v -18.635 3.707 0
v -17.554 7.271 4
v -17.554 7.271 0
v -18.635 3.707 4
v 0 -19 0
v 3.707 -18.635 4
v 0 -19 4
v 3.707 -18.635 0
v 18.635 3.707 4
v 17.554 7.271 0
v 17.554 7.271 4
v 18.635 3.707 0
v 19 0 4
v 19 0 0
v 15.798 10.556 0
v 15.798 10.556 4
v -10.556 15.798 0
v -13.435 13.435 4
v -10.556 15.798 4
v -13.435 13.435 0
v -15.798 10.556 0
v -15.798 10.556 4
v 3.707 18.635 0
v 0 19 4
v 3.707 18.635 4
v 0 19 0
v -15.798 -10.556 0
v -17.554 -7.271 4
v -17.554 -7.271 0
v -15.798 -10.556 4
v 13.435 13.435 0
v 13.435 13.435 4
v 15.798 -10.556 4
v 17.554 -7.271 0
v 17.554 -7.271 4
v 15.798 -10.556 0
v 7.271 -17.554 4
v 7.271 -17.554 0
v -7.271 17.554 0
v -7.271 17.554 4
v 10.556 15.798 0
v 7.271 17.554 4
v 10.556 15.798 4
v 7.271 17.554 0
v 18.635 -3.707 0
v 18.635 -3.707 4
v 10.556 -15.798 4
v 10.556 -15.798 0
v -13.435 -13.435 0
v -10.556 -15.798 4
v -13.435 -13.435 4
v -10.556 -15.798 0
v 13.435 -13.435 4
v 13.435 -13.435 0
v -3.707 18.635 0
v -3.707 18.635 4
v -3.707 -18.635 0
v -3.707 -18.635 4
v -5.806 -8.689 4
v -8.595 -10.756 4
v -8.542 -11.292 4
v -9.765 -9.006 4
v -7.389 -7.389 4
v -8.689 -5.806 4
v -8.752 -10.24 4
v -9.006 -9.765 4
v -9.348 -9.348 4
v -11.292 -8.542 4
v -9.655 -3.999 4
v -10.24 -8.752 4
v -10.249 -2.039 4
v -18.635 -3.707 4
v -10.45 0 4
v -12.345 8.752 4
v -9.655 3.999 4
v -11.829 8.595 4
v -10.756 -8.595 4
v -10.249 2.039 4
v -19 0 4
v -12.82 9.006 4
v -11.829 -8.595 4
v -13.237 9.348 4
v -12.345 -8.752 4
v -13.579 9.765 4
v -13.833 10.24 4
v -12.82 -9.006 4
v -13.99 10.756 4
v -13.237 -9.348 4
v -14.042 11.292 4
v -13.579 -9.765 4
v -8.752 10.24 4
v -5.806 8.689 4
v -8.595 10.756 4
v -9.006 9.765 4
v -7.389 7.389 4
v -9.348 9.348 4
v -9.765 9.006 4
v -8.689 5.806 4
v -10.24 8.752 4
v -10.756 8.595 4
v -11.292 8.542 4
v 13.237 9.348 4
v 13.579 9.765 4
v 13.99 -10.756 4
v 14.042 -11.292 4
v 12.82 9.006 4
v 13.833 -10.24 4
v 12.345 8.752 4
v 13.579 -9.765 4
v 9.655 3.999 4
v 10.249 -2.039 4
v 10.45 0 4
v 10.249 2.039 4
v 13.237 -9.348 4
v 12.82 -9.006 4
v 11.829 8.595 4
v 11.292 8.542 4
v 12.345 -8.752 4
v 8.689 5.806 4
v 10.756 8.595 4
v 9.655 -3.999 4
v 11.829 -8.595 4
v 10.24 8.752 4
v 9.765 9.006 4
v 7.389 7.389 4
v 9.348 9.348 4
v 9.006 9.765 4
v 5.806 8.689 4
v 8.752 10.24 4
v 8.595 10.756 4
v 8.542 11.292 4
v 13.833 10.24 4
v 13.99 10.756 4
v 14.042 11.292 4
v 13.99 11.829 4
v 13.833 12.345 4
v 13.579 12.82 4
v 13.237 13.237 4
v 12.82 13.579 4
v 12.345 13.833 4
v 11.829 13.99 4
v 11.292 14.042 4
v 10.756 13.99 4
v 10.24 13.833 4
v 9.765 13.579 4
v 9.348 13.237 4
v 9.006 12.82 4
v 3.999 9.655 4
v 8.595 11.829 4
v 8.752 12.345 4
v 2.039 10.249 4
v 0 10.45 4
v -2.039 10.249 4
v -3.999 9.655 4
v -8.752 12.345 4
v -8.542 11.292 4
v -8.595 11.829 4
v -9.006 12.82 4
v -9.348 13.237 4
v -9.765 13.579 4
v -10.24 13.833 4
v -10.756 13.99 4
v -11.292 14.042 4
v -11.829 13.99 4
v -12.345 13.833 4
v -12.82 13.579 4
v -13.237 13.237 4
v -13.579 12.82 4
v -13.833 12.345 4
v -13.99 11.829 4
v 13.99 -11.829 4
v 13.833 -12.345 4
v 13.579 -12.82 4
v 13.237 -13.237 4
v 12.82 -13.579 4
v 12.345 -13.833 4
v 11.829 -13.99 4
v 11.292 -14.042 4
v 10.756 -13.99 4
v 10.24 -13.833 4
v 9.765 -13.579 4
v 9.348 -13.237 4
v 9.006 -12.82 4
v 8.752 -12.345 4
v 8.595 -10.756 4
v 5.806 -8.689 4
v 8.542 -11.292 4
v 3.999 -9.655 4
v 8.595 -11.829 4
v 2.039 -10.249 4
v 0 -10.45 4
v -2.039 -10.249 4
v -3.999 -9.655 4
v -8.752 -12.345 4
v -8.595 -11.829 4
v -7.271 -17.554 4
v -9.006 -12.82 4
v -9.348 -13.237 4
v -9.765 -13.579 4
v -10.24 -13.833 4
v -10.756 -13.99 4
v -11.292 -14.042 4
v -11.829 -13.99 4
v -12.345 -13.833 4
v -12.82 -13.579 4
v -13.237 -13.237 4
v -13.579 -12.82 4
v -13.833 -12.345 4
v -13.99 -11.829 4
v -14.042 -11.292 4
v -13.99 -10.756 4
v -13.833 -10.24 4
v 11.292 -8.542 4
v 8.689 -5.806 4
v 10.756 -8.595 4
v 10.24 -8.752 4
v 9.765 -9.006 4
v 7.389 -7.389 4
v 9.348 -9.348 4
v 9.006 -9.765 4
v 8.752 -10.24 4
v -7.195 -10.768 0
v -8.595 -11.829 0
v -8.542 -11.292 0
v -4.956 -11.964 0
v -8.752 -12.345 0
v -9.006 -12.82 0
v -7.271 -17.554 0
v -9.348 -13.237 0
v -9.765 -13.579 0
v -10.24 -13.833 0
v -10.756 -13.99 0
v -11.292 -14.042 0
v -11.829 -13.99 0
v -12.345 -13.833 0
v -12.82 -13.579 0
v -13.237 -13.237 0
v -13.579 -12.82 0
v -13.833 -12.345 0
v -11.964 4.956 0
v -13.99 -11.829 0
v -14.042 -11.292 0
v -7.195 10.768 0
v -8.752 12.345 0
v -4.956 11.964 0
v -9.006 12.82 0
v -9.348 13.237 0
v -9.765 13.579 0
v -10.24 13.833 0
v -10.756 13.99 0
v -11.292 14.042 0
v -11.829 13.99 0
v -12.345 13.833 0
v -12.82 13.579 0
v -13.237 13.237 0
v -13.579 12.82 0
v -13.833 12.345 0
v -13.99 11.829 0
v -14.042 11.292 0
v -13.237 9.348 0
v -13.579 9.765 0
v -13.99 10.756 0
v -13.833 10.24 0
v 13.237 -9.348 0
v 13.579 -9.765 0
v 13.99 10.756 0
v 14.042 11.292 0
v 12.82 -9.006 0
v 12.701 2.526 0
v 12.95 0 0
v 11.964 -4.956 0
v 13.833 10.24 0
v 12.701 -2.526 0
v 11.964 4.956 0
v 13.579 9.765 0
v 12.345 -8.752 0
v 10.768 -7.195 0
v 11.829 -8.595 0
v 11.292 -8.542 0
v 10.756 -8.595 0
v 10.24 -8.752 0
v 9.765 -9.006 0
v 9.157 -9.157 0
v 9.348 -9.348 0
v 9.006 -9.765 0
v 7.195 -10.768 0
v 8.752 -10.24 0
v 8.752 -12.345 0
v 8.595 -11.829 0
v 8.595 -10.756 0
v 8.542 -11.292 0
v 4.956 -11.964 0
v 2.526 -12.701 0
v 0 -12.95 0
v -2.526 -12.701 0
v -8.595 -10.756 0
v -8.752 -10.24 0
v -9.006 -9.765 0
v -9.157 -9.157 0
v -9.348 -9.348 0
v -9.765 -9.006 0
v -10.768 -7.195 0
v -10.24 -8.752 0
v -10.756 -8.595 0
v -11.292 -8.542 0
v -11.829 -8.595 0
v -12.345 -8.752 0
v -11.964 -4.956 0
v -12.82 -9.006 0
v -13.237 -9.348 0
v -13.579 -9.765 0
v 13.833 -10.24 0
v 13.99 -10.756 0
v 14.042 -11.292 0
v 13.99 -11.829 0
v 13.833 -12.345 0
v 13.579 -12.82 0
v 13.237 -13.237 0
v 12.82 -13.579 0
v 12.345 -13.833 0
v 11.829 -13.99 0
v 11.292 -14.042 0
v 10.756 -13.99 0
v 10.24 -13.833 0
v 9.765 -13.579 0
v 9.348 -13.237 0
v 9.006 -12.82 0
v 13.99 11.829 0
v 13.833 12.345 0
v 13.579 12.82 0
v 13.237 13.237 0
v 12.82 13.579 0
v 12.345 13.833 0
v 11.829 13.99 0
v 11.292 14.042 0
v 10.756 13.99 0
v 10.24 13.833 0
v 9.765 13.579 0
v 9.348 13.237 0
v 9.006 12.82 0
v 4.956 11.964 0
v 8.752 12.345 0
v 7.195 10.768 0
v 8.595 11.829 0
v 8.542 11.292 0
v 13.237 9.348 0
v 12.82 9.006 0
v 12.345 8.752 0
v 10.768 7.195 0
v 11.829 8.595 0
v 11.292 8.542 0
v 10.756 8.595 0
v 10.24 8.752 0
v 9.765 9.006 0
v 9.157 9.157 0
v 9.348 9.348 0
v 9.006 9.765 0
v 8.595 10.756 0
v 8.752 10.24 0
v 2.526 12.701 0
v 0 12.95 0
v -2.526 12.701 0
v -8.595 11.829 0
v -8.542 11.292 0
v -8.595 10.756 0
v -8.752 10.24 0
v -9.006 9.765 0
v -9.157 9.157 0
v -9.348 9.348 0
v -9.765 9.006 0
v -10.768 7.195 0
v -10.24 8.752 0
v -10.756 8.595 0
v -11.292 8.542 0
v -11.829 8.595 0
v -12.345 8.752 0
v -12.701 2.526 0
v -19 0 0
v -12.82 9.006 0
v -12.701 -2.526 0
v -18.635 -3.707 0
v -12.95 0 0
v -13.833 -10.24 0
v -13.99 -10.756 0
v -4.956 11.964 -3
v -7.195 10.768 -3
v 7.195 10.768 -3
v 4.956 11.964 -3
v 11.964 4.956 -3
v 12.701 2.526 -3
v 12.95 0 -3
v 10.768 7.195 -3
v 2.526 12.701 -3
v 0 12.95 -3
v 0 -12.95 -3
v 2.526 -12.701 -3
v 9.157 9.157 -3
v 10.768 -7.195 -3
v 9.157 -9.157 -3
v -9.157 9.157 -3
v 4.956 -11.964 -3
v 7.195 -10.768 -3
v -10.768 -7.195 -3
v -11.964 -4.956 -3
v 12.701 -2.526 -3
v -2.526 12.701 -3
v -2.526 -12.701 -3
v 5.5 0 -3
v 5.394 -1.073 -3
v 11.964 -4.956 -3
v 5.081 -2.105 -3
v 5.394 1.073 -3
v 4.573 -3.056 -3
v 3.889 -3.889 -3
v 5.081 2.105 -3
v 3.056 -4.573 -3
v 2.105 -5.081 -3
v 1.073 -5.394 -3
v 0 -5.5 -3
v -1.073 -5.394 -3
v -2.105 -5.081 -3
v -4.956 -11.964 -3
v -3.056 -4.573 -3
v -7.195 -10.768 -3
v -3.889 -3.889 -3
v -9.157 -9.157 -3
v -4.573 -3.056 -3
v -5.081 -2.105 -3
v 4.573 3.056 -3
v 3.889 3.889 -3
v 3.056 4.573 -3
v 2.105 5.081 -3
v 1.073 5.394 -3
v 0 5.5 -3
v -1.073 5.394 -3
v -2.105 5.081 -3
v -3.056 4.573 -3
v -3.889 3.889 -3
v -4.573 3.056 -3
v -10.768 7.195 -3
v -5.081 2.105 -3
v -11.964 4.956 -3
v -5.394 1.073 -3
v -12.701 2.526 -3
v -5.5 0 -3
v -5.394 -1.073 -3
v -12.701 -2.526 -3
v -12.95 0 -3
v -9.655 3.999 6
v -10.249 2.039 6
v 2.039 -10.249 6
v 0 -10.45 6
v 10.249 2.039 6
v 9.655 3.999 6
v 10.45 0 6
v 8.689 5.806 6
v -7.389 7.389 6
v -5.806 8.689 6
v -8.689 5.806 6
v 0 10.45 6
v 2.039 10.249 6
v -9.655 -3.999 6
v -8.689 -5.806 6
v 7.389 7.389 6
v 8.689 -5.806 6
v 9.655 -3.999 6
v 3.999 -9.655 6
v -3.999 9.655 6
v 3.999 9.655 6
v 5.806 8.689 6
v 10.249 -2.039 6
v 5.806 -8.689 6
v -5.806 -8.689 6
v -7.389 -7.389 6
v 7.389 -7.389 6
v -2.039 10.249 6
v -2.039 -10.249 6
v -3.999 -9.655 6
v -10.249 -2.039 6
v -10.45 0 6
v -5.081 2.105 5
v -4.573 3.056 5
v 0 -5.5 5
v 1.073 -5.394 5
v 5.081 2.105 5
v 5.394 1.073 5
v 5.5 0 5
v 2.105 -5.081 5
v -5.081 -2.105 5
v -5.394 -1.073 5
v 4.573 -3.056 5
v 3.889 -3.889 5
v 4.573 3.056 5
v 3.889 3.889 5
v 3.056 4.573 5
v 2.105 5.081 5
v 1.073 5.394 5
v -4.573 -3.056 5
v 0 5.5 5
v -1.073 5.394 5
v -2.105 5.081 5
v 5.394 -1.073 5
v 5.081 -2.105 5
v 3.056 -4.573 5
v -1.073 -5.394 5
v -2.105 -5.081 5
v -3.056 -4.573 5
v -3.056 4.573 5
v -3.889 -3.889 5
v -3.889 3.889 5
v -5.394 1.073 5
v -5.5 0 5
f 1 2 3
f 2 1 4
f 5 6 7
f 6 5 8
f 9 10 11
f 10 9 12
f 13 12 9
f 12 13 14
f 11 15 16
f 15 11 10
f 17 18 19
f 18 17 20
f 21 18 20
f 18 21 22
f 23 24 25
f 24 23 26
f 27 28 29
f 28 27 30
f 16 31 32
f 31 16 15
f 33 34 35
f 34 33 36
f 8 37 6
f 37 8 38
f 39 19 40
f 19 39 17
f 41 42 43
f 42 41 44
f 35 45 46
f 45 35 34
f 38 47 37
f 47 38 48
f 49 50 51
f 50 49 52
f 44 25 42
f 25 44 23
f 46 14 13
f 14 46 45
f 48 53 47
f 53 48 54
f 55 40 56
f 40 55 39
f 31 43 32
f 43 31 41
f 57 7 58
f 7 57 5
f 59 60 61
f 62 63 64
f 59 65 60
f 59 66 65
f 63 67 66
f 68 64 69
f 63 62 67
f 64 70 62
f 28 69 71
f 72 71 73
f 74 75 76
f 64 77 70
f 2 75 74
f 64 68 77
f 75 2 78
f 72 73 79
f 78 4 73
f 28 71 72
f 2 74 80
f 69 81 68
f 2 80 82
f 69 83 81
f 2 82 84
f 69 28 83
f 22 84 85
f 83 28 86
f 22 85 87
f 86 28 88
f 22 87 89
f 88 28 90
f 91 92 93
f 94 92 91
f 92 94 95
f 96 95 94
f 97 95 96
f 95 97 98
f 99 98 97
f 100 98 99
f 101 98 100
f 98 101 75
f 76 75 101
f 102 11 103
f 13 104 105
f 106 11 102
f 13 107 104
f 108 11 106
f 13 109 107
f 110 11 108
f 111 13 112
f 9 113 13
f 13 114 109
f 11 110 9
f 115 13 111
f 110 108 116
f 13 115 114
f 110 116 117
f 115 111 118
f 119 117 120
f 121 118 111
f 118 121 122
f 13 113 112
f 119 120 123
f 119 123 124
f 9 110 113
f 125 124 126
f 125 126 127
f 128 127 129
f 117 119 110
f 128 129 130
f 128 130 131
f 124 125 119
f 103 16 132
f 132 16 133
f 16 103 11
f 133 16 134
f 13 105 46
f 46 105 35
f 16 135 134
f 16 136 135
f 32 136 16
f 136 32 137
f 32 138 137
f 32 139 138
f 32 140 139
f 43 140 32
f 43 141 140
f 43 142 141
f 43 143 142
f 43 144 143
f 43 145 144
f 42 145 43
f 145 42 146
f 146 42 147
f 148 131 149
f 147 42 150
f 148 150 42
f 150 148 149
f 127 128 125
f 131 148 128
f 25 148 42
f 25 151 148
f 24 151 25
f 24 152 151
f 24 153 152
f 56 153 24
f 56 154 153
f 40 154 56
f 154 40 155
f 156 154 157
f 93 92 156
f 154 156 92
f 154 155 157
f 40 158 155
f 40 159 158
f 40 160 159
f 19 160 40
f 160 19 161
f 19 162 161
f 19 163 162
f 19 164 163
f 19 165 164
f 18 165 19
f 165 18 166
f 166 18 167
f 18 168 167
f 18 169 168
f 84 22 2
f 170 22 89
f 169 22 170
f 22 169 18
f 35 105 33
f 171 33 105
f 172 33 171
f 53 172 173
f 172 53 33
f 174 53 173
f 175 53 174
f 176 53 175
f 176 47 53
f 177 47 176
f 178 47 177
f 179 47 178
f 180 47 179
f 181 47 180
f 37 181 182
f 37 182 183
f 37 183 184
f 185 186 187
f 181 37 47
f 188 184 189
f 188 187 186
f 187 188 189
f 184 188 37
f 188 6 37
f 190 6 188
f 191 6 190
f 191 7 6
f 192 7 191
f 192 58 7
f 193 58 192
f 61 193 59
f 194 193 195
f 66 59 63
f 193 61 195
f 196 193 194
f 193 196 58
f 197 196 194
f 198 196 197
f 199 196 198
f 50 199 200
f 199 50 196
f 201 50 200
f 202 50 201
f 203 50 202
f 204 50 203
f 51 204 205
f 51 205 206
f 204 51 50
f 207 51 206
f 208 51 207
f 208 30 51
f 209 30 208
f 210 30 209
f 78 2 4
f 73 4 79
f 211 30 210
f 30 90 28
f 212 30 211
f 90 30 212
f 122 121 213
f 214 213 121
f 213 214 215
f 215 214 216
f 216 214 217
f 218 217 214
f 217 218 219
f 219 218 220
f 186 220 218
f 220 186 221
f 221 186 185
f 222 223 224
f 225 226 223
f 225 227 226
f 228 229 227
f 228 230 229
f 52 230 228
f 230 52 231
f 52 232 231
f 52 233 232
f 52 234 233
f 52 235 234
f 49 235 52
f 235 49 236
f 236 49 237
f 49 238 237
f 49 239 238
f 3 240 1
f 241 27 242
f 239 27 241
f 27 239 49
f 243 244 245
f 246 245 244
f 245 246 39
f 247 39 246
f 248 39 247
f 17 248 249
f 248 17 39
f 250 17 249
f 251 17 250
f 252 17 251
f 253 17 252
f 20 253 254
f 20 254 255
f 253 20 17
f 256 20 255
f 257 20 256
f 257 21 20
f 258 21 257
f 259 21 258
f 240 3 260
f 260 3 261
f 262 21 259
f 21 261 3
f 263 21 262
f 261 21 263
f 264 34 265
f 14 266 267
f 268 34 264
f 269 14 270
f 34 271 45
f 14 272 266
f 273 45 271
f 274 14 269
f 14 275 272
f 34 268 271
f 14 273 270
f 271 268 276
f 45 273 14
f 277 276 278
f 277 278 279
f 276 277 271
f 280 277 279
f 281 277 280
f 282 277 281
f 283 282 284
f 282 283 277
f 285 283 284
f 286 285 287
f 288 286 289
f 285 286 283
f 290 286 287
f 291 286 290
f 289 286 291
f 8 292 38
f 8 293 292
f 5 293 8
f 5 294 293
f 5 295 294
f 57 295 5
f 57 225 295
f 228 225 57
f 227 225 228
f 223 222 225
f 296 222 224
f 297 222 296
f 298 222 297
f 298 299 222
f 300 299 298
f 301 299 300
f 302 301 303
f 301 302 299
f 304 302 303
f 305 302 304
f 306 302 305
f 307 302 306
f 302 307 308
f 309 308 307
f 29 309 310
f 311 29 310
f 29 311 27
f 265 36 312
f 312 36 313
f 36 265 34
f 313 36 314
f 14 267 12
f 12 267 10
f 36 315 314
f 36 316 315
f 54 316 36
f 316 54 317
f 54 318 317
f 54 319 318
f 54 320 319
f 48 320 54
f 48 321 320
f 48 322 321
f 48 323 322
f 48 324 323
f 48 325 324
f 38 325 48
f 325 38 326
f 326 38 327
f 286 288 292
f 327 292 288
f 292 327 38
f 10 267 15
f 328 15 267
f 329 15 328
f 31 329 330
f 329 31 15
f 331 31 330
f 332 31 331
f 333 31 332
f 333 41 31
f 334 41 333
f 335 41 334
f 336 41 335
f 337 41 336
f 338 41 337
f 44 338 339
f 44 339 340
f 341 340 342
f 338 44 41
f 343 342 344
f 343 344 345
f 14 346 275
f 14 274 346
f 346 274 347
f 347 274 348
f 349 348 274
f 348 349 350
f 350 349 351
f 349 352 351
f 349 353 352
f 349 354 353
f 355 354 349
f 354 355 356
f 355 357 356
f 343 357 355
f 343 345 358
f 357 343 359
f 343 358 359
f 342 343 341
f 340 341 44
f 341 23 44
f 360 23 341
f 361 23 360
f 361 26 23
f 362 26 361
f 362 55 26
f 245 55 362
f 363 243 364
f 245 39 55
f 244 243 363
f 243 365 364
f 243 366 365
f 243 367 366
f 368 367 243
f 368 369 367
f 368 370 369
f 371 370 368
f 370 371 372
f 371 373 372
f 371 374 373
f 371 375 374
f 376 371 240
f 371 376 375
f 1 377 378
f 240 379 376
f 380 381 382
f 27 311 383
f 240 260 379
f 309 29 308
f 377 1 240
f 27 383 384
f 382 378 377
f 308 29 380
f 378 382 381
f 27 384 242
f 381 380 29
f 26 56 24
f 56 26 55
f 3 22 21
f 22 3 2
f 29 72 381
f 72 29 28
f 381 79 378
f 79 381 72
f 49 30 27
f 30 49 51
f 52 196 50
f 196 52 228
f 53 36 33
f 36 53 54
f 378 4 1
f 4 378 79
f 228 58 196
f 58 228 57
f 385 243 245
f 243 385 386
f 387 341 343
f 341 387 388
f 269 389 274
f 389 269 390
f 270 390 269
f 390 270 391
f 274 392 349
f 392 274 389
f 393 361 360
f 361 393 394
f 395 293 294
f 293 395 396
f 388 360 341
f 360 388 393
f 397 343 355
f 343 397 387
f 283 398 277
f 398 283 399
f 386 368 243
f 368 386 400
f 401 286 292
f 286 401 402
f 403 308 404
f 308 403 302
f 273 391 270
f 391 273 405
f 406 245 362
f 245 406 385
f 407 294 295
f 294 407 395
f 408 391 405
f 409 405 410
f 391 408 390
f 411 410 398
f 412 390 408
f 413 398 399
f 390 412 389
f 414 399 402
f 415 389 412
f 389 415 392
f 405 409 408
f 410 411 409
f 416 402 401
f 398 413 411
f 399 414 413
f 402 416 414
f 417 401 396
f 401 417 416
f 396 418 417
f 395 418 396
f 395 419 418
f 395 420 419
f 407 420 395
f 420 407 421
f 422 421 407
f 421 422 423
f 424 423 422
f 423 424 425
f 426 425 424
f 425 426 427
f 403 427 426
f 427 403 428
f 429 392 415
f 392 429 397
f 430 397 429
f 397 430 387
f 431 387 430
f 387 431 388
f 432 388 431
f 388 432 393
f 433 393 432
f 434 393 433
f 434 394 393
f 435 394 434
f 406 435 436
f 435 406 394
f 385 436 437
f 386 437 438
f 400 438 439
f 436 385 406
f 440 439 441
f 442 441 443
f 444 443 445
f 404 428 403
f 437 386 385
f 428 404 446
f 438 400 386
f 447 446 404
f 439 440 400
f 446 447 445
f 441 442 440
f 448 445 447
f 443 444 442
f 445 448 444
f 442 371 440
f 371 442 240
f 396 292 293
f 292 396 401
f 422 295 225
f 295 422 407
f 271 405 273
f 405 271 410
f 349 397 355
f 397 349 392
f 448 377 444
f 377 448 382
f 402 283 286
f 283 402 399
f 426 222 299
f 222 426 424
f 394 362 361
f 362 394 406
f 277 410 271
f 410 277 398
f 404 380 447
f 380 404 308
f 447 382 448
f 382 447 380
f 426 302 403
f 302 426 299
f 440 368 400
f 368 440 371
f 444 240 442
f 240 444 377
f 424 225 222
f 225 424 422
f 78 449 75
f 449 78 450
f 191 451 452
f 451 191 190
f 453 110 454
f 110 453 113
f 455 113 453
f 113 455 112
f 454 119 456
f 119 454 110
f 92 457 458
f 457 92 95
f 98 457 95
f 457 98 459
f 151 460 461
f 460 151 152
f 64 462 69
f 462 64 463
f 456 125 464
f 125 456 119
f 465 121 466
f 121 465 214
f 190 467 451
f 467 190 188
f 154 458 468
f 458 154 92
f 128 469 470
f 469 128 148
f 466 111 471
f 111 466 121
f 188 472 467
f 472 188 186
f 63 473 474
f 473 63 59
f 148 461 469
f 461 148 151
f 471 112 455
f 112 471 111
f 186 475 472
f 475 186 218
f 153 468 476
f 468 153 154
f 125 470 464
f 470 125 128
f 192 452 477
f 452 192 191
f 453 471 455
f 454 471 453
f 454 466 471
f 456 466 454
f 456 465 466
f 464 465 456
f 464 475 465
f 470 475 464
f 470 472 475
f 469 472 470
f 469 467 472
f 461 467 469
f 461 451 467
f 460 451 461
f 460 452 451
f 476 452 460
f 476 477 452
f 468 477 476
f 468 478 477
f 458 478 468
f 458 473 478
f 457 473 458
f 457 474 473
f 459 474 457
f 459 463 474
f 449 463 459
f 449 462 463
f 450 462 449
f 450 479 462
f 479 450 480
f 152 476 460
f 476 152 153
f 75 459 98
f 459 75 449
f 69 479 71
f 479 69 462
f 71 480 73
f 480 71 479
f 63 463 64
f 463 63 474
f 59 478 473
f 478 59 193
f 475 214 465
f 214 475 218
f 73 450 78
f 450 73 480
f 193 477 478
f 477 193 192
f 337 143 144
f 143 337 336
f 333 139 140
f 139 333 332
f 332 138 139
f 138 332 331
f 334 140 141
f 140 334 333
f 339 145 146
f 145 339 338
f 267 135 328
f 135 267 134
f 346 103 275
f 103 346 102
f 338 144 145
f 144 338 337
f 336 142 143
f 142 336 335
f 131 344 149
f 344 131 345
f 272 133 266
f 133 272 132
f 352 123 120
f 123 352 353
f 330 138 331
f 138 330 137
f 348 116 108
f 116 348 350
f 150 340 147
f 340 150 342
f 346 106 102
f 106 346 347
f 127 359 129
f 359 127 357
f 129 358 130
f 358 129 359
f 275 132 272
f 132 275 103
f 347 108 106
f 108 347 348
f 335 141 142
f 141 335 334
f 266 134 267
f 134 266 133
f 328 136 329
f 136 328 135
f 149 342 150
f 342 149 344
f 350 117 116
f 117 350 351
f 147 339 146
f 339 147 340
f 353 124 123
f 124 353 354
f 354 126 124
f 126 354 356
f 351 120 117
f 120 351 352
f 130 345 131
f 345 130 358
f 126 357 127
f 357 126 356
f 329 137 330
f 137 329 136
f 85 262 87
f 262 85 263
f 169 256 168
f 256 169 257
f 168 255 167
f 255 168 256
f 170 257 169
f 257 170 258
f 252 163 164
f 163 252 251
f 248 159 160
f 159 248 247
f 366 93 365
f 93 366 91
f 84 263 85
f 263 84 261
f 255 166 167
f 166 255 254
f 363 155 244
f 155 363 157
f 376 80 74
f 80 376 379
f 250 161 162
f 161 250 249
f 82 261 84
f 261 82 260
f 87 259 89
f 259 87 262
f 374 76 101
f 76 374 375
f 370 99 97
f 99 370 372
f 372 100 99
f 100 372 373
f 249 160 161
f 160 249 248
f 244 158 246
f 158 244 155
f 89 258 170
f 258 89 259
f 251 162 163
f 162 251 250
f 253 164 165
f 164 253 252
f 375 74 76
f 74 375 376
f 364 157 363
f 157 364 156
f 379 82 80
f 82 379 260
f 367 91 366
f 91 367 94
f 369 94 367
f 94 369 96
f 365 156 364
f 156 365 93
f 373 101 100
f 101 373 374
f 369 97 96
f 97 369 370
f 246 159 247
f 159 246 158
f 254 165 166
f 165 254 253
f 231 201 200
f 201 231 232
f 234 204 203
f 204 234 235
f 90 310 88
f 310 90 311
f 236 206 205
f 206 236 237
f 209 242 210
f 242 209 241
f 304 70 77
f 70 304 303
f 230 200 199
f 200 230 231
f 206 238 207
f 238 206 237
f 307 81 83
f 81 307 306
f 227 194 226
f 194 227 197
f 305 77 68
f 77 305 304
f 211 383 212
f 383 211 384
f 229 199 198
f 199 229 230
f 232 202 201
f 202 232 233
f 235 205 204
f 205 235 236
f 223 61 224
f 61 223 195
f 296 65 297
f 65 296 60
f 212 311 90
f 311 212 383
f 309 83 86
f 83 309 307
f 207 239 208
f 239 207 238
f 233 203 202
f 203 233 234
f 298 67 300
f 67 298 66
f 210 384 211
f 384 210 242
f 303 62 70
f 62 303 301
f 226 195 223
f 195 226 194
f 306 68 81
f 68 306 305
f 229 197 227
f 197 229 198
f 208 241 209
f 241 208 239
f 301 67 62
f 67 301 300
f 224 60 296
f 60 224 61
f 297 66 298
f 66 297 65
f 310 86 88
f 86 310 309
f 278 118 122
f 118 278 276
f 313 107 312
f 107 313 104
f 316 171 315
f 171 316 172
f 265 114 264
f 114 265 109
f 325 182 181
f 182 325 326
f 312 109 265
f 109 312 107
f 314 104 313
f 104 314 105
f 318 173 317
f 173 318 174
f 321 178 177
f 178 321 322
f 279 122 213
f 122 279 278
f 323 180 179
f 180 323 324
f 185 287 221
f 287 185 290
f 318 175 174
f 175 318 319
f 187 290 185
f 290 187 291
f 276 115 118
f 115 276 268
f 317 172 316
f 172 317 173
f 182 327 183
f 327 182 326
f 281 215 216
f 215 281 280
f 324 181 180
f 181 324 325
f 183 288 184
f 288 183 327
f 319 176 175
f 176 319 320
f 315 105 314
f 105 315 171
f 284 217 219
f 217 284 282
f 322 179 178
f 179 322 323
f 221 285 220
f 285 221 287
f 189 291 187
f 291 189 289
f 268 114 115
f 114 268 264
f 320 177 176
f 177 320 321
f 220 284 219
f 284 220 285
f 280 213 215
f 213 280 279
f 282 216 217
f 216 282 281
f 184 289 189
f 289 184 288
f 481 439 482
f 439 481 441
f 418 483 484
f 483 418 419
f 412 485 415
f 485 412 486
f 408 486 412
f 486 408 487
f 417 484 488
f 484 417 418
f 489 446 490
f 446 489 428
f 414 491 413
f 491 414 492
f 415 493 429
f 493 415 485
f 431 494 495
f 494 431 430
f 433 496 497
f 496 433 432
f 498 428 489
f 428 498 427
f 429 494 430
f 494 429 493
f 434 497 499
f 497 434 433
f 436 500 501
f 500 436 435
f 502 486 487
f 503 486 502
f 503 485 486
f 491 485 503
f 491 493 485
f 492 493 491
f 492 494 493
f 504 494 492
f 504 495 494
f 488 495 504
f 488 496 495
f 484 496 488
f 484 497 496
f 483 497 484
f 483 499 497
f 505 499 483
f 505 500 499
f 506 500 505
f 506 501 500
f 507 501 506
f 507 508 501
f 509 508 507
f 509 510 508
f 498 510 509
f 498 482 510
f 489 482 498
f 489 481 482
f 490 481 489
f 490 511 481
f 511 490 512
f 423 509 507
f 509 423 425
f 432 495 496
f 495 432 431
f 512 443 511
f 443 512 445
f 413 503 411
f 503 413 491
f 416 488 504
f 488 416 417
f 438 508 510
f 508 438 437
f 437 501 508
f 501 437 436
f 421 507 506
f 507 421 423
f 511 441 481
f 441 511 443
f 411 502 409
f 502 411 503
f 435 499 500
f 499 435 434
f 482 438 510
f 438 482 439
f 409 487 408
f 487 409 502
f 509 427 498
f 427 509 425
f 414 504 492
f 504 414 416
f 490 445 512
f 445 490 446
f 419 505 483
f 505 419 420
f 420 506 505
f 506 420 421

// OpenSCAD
$fn = 32;

// ----------------------------------------------------------------------
// Retaining cap: 6000 cover, 38 mm, spigot 25.9 mm
// ----------------------------------------------------------------------

// --- parameters (mm) ---
cap_d = 38;               // cover diameter
cap_t = 4;                // cover thickness
lip_d = 25.9;             // spigot that enters the housing
lip_h = 3;                // spigot height
shaft_d = 11;             // shaft opening
bolt_d = 5.5;             // bolt clearance
bolt_r = 15.97;           // bolt circle radius
dome_h = 2;               // raised centre

module cover() {
  cylinder(h = cap_t, d = cap_d);
}

module spigot() {
  /* sunk 1 mm into the cover; the spigot sets the overall height */
  translate([0, 0, -lip_h]) cylinder(h = lip_h + 1, d = lip_d);
}

module dome() {
  translate([0, 0, cap_t - 1]) cylinder(h = dome_h + 1, d = cap_d * 0.55);
}

difference() {
  union() {
    cover();
    spigot();
    dome();
  }
  for (i = [0 : 3]) rotate([0, 0, 45 + i * 90]) translate([bolt_r, 0, -lip_h - 1])
    cylinder(h = lip_h + cap_t + 2, d = bolt_d);
  translate([0, 0, -lip_h - 1]) cylinder(h = lip_h + cap_t + 2, d = shaft_d);
}
